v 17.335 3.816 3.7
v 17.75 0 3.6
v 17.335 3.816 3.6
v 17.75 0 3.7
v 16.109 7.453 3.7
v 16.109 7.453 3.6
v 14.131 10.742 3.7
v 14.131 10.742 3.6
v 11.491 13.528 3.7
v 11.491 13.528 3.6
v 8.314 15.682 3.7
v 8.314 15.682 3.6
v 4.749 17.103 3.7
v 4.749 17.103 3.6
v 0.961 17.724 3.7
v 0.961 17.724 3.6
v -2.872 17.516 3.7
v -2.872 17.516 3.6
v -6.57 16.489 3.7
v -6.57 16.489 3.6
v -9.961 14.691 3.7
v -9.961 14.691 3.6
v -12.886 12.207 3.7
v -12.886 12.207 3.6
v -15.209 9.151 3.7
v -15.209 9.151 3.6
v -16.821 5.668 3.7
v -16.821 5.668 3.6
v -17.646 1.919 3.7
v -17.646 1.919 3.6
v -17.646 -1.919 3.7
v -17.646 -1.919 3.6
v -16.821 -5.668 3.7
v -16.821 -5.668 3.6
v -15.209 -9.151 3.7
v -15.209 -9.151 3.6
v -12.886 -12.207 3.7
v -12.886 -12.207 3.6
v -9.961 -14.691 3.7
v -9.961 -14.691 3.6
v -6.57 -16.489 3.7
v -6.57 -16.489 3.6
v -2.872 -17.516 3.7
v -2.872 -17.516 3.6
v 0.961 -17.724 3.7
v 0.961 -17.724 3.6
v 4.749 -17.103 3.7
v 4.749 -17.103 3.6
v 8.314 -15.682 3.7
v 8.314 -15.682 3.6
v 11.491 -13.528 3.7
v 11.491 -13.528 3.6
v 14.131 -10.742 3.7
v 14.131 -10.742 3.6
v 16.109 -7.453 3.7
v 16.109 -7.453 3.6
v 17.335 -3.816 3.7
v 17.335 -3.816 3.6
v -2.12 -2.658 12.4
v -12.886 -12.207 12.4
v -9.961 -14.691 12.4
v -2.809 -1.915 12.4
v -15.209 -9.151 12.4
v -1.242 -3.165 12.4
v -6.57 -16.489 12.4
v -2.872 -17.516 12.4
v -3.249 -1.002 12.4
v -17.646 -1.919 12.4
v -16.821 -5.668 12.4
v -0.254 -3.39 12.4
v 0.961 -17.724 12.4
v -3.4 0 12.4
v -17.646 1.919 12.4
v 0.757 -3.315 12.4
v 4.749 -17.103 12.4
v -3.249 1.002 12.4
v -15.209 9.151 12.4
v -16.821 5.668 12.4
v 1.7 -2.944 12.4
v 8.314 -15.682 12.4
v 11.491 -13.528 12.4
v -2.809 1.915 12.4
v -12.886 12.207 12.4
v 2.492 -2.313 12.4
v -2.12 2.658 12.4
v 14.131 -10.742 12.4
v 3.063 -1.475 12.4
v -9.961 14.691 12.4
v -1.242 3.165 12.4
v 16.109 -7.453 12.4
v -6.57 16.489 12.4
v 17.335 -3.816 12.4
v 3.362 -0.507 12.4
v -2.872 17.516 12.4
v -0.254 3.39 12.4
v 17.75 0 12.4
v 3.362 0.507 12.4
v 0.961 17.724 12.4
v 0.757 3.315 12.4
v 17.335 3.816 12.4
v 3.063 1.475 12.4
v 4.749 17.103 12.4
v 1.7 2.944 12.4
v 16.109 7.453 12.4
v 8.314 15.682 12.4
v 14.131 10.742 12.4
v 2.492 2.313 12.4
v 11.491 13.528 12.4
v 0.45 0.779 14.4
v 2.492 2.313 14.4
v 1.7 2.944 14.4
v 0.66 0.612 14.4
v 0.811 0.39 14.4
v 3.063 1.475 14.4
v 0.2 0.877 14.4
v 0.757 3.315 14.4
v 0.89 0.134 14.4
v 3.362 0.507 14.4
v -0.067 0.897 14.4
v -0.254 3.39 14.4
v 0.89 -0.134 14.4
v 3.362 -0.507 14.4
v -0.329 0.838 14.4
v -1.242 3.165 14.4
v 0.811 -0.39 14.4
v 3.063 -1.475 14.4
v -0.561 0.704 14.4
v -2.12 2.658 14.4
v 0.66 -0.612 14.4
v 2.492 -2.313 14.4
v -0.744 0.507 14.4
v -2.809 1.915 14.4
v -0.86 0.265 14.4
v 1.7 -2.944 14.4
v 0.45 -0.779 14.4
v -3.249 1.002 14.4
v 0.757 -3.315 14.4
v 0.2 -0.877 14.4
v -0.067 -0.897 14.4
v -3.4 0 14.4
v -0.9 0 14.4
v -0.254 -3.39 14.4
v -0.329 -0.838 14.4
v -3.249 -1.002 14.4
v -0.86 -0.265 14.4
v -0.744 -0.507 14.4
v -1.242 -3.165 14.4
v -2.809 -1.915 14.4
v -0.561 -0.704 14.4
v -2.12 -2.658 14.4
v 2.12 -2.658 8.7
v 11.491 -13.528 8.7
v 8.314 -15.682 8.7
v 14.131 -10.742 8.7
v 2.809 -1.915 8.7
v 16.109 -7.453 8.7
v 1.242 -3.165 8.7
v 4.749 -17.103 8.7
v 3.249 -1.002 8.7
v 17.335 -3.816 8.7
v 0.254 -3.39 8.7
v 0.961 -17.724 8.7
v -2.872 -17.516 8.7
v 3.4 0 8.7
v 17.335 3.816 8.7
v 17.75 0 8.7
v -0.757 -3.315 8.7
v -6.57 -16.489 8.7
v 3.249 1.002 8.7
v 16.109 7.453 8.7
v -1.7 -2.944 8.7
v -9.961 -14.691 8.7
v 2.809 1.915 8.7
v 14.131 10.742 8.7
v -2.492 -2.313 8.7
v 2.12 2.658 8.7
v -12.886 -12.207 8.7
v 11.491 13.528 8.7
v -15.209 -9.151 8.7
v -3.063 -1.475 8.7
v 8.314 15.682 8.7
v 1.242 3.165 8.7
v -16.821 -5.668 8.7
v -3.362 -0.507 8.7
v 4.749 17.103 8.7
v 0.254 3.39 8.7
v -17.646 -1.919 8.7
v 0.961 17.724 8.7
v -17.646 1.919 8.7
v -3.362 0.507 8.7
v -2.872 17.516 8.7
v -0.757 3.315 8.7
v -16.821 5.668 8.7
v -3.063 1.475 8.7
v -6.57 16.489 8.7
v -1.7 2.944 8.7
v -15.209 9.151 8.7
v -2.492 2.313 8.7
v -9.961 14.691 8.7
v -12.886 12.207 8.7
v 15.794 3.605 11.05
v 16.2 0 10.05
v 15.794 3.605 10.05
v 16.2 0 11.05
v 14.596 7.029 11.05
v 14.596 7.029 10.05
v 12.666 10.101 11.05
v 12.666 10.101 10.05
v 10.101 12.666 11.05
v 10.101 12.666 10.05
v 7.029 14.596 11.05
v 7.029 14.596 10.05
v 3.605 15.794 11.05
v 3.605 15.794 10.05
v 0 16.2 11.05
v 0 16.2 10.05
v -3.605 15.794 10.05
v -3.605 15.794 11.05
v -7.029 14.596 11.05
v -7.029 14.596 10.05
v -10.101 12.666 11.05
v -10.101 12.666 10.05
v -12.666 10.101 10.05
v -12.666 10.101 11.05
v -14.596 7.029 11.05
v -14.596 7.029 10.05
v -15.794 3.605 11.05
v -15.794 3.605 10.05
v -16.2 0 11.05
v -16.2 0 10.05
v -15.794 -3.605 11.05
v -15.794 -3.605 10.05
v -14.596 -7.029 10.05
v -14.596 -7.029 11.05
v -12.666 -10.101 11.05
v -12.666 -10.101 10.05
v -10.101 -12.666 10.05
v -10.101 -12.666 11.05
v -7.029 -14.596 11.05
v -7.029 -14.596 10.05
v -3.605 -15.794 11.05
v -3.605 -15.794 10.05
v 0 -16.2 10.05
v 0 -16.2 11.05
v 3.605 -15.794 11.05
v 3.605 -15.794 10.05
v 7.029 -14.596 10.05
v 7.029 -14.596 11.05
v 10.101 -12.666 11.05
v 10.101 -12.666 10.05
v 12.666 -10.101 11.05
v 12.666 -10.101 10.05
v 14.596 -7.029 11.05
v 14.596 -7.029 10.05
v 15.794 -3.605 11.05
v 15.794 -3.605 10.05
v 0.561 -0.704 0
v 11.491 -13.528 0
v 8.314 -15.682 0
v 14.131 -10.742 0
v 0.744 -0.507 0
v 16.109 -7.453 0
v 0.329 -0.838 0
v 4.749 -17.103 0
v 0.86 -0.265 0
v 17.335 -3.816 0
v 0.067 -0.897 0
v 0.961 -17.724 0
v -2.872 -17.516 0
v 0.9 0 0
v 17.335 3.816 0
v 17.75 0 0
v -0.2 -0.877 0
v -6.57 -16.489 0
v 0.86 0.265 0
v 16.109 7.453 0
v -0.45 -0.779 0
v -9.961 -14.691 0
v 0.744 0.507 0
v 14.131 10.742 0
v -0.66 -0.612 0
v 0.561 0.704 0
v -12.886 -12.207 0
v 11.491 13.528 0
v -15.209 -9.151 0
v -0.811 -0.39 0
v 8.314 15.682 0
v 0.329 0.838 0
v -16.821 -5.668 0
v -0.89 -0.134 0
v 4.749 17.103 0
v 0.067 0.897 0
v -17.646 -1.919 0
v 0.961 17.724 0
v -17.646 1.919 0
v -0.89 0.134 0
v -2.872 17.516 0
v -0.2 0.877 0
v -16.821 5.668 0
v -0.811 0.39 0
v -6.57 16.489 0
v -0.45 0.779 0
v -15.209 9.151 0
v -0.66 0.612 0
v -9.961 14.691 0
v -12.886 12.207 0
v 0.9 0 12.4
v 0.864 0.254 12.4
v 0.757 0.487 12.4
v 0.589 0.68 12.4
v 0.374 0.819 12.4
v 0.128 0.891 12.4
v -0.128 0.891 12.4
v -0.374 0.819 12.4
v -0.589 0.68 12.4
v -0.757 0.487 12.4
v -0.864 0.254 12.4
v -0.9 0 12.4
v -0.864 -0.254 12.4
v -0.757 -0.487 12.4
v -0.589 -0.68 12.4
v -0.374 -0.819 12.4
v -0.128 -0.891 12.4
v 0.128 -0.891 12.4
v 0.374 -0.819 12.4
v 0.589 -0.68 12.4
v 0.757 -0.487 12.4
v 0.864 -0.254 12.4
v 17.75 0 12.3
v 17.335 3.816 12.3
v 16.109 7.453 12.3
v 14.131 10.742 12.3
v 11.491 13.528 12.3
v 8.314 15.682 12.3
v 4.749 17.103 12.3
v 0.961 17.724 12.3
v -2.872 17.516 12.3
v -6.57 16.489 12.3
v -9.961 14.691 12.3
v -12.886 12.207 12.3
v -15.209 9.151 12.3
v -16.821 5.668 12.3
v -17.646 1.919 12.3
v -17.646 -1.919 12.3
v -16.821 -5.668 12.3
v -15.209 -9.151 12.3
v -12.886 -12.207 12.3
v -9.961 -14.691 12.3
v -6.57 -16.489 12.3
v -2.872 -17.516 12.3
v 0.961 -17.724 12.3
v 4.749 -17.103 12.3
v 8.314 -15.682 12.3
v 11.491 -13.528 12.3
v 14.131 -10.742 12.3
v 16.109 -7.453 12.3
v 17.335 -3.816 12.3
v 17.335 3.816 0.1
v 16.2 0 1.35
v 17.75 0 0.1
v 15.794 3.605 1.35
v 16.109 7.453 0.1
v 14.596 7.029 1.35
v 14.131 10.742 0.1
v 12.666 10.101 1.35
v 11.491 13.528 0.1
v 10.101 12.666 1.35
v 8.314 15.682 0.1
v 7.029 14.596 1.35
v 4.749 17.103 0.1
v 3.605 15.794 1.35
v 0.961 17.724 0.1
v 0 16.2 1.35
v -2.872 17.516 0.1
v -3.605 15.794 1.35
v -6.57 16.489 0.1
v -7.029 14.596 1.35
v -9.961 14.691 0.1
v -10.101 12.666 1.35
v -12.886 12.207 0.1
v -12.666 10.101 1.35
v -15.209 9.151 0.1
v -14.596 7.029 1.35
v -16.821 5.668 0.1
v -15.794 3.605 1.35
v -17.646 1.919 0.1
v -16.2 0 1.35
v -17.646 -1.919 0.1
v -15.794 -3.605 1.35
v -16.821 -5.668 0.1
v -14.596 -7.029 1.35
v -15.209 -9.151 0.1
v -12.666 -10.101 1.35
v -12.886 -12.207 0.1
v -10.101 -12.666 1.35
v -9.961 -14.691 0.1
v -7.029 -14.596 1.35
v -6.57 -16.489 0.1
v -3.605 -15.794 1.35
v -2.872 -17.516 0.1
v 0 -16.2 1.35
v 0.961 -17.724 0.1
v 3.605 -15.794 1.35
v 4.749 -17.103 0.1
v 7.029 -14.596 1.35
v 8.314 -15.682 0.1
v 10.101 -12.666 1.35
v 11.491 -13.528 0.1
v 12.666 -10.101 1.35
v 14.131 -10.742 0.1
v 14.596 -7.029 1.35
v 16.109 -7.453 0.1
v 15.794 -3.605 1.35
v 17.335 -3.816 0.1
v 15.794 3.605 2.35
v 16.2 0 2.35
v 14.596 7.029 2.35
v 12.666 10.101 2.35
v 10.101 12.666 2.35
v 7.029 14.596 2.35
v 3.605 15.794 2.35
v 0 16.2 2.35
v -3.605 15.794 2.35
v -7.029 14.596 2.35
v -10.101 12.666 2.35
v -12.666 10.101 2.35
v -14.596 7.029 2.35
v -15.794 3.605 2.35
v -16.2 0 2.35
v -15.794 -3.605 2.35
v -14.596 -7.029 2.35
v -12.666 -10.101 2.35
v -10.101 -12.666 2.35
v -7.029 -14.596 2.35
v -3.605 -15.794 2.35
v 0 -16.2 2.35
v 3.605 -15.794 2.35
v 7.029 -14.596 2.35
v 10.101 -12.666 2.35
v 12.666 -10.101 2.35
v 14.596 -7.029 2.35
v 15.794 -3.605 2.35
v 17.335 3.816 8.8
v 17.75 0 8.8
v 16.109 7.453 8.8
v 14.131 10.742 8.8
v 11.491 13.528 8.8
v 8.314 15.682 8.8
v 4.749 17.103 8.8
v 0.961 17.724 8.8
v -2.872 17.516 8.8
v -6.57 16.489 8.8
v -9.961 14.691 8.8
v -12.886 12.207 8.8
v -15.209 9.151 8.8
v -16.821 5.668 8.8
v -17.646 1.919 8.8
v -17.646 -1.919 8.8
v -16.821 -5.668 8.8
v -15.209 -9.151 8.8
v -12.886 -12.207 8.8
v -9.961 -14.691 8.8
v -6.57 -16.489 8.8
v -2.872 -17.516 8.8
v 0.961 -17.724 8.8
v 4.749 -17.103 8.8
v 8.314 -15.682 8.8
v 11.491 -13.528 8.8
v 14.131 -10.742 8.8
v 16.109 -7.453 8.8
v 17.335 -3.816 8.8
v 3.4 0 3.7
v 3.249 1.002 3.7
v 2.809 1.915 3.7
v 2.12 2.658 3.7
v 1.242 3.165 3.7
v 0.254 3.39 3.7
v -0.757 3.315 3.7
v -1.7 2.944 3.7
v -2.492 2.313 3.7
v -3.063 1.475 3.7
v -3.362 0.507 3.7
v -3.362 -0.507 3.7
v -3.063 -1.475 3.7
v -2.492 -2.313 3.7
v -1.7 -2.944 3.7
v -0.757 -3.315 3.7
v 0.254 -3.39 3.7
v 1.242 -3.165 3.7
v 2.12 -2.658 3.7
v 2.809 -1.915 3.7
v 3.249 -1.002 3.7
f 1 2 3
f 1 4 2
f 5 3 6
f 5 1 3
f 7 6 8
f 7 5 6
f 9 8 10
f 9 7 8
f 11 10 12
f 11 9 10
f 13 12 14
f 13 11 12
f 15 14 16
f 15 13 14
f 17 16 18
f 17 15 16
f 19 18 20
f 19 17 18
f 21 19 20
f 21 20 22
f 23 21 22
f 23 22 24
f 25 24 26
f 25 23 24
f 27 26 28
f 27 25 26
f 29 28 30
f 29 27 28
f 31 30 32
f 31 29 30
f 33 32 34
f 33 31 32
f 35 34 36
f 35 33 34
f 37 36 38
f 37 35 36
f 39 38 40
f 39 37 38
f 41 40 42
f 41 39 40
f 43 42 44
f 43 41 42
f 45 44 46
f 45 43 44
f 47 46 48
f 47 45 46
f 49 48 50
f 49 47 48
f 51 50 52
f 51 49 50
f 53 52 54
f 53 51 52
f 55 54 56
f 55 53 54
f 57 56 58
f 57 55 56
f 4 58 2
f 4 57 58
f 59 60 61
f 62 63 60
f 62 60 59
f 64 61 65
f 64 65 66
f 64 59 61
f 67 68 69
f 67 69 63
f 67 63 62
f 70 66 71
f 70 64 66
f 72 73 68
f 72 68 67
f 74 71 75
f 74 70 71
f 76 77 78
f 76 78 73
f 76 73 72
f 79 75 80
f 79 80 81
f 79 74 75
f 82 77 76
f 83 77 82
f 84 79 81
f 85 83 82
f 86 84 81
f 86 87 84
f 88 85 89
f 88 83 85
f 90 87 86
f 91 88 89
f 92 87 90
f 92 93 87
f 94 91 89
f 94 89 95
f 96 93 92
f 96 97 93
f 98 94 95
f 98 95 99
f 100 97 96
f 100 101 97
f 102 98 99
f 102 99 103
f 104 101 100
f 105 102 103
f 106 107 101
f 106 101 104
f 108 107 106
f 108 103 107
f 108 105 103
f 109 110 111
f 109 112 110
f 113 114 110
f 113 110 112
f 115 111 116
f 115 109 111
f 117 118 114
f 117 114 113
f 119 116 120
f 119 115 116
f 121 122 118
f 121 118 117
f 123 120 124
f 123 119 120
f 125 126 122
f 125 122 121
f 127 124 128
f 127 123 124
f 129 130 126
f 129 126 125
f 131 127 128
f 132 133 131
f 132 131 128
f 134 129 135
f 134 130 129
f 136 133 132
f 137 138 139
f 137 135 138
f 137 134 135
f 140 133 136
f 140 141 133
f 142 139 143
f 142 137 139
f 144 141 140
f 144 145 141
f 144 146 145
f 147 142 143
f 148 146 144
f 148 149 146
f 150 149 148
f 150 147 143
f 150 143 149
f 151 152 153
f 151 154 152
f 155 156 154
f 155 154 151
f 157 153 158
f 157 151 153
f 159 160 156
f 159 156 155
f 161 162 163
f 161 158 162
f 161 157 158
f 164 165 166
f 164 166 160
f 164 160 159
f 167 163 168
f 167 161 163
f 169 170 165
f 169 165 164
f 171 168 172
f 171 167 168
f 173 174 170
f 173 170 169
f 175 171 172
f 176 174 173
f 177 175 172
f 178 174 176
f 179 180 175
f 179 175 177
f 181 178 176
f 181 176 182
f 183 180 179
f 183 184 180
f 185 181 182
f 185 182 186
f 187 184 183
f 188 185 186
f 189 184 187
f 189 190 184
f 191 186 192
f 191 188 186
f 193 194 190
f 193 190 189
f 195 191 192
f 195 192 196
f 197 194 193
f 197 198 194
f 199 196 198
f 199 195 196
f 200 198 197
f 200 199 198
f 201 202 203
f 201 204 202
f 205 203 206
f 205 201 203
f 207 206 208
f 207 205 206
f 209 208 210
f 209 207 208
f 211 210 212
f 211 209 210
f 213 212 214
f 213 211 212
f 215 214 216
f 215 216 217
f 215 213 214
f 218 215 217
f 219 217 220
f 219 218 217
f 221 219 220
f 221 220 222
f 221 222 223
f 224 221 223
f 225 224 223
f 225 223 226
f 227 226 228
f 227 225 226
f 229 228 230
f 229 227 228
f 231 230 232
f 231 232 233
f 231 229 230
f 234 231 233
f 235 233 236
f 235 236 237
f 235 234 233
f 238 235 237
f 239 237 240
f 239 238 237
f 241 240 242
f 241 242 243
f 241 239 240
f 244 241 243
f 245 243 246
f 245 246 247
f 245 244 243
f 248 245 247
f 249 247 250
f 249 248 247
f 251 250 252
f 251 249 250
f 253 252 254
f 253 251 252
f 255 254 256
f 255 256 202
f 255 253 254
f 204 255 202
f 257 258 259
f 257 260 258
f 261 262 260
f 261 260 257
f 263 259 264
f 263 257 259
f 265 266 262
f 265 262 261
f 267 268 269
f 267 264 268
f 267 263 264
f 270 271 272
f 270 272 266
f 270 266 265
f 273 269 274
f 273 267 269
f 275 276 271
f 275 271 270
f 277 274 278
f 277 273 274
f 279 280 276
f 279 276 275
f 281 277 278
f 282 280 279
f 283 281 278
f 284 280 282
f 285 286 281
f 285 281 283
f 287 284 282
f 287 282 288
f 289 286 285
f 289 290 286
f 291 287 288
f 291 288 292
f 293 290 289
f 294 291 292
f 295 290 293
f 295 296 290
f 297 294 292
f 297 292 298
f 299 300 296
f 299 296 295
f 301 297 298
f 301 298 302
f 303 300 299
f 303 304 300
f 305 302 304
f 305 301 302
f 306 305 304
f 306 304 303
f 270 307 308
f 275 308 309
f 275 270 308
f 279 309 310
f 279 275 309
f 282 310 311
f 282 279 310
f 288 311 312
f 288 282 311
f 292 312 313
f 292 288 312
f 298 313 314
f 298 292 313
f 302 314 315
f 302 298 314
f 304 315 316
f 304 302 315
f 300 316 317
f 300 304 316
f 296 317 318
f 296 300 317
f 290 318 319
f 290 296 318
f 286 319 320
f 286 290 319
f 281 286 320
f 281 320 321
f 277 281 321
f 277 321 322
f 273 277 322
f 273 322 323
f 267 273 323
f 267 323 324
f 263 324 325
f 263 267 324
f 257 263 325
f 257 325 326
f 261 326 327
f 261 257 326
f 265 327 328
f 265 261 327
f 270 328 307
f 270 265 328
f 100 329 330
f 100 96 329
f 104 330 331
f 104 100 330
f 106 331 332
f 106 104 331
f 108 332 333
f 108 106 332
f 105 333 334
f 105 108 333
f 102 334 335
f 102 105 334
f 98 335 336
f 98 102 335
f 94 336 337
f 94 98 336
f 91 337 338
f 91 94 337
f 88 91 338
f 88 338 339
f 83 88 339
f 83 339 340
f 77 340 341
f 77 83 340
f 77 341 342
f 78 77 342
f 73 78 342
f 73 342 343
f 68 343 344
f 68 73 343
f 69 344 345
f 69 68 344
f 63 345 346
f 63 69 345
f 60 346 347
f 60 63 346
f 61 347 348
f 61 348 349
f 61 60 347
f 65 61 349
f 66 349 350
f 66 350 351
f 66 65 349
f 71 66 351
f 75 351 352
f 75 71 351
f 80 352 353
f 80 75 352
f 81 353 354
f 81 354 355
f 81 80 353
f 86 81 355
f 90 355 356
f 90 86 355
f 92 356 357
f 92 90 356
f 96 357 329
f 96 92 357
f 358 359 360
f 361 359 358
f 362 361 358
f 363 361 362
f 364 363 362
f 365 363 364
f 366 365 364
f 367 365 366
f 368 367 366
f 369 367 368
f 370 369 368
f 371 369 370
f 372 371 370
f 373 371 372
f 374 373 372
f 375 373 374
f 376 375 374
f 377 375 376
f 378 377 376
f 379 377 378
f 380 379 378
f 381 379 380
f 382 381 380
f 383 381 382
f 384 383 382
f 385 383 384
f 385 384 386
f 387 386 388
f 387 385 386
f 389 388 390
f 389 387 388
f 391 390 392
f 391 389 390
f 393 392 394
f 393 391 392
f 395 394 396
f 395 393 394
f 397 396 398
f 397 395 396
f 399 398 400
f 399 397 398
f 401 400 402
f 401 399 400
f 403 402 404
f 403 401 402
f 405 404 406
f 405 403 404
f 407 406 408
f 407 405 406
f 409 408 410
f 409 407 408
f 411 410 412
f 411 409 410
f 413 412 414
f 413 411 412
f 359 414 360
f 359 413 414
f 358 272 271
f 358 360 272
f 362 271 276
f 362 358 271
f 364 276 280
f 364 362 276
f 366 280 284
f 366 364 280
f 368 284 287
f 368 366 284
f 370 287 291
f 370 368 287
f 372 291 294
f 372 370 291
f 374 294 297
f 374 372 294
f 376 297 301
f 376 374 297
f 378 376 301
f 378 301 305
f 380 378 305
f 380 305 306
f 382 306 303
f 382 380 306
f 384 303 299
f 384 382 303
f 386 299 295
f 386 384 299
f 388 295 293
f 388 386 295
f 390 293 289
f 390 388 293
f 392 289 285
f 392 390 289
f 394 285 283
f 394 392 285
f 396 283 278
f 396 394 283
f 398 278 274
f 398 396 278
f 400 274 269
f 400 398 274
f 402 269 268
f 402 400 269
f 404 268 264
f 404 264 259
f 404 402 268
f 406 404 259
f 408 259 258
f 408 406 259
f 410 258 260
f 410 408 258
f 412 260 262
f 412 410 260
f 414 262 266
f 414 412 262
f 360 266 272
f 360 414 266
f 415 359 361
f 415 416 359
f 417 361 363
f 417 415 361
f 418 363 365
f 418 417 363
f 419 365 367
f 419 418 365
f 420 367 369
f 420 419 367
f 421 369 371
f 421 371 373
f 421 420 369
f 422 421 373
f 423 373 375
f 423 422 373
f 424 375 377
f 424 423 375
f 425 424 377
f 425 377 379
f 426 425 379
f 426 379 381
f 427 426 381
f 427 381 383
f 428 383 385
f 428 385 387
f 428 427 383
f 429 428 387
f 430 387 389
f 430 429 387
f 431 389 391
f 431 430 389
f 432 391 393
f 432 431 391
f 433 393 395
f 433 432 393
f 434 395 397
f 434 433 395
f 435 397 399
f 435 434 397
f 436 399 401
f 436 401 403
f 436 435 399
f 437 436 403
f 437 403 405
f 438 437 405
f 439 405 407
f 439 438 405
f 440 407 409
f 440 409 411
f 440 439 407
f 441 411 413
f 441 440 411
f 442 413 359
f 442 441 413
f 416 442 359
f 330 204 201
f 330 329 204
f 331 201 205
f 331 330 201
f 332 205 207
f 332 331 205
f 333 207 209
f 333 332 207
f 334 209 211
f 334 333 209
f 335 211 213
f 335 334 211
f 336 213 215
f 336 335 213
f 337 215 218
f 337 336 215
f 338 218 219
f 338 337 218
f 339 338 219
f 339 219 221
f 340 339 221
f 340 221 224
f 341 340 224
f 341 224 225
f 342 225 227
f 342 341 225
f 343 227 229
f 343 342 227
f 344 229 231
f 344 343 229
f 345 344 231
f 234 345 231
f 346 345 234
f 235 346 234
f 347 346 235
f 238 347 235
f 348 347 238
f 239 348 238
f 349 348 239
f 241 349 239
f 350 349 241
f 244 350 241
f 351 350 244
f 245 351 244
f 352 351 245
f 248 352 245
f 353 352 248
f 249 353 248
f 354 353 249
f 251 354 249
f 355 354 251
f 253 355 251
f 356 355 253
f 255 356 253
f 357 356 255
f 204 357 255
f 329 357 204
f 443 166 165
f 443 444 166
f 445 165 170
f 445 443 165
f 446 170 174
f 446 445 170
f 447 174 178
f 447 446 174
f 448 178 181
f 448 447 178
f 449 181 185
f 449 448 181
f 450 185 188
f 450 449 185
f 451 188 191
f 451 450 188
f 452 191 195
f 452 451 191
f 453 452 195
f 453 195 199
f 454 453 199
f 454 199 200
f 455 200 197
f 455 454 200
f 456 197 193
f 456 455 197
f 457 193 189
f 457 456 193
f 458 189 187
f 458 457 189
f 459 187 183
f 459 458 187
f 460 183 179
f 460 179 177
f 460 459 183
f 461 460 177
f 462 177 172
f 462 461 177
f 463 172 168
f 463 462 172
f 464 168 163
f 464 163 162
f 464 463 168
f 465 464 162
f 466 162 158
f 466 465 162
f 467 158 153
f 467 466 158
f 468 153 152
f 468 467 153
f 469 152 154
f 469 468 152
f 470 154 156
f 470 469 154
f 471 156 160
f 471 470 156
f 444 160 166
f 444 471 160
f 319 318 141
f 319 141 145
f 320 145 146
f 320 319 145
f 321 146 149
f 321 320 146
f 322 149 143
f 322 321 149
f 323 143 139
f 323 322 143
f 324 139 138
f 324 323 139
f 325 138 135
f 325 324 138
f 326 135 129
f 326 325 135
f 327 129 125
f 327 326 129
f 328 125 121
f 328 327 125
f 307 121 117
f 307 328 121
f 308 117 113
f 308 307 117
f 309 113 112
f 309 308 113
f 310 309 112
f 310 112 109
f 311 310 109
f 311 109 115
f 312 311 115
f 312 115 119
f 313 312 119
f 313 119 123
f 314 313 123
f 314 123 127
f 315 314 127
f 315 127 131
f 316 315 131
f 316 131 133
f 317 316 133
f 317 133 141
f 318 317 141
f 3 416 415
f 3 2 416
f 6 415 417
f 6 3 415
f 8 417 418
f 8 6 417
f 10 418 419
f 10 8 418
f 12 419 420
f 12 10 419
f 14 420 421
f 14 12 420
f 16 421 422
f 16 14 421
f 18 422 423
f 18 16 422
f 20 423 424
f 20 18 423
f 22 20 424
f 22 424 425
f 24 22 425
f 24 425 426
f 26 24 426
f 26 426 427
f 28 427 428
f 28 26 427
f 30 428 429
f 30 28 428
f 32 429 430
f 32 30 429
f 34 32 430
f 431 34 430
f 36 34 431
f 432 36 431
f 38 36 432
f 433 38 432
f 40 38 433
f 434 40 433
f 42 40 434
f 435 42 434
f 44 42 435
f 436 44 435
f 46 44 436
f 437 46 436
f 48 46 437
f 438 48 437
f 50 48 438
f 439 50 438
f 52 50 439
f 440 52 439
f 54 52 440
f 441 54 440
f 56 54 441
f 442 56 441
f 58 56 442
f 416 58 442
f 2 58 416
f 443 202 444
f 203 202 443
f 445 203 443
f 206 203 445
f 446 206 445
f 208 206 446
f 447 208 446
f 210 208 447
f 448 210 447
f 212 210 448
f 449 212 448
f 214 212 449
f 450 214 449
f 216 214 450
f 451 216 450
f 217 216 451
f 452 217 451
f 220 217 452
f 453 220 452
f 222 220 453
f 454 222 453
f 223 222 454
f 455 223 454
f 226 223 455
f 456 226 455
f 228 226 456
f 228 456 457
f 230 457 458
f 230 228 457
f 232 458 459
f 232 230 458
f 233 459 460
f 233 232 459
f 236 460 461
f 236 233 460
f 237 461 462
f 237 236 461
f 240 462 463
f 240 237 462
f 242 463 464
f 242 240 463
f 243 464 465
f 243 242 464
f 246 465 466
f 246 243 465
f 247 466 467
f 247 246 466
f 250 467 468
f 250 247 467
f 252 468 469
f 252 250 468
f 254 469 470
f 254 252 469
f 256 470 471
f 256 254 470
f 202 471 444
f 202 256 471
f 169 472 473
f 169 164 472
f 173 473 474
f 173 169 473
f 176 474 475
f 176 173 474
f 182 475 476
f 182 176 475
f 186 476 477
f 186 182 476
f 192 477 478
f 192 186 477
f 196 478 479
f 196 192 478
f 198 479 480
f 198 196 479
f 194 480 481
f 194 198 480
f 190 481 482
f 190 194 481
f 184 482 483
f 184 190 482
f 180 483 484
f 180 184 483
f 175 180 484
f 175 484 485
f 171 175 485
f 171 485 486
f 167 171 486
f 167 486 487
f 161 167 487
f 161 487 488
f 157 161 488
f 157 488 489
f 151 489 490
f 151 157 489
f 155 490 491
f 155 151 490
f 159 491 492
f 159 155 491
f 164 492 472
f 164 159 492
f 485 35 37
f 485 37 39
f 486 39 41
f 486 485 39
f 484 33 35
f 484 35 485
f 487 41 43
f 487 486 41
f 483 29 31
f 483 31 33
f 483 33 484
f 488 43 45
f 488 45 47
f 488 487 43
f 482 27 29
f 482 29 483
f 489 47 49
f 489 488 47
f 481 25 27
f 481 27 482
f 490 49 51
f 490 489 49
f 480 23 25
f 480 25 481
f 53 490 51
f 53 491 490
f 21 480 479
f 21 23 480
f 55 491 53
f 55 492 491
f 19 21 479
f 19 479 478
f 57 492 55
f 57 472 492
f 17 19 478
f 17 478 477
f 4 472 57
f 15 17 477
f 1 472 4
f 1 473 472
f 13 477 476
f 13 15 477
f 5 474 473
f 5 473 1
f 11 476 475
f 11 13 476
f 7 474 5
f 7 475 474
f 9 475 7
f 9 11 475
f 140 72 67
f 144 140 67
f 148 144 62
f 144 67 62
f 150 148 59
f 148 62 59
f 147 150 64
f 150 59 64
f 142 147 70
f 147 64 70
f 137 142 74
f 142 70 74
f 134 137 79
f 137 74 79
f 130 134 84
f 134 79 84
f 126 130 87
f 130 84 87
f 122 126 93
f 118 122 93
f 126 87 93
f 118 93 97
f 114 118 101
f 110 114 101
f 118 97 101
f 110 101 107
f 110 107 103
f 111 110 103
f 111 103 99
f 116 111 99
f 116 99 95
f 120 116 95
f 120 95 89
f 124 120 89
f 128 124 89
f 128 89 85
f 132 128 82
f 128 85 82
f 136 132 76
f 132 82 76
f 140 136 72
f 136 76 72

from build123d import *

# Parameters (mm, degrees)
SKETCH001_R   = 3.4
SKETCH001_R_2 = 0.9
PAD_DEPTH     = 2


with BuildPart() as part:
    # Sketch → Revolution (revolve)
    with BuildSketch(Plane.XZ):
        Polygon((0.9, 12.4), (0.9, 0), (17.75, 0), (17.75, 0.1), (16.2, 1.35), (16.2, 2.35), (17.75, 3.6), (17.75, 3.7), (3.4, 3.7), (3.4, 8.7), (17.75, 8.7), (17.75, 8.8), (16.2, 10.05), (16.2, 11.05), (17.75, 12.3), (17.75, 12.4), align=None)
    revolve(axis=Axis((0, 0, 0), (0, 0, 1)))

    # Sketch001 (on Face1 of Revolution) → Pad (new body)
    with BuildSketch(Plane(origin=(0, 0, 12.4), x_dir=(-1, 0, 0), z_dir=(0, 0, 1))):
        Circle(SKETCH001_R)
        Circle(SKETCH001_R_2, mode=Mode.SUBTRACT)
    extrude(amount=PAD_DEPTH)


solid = part.part
